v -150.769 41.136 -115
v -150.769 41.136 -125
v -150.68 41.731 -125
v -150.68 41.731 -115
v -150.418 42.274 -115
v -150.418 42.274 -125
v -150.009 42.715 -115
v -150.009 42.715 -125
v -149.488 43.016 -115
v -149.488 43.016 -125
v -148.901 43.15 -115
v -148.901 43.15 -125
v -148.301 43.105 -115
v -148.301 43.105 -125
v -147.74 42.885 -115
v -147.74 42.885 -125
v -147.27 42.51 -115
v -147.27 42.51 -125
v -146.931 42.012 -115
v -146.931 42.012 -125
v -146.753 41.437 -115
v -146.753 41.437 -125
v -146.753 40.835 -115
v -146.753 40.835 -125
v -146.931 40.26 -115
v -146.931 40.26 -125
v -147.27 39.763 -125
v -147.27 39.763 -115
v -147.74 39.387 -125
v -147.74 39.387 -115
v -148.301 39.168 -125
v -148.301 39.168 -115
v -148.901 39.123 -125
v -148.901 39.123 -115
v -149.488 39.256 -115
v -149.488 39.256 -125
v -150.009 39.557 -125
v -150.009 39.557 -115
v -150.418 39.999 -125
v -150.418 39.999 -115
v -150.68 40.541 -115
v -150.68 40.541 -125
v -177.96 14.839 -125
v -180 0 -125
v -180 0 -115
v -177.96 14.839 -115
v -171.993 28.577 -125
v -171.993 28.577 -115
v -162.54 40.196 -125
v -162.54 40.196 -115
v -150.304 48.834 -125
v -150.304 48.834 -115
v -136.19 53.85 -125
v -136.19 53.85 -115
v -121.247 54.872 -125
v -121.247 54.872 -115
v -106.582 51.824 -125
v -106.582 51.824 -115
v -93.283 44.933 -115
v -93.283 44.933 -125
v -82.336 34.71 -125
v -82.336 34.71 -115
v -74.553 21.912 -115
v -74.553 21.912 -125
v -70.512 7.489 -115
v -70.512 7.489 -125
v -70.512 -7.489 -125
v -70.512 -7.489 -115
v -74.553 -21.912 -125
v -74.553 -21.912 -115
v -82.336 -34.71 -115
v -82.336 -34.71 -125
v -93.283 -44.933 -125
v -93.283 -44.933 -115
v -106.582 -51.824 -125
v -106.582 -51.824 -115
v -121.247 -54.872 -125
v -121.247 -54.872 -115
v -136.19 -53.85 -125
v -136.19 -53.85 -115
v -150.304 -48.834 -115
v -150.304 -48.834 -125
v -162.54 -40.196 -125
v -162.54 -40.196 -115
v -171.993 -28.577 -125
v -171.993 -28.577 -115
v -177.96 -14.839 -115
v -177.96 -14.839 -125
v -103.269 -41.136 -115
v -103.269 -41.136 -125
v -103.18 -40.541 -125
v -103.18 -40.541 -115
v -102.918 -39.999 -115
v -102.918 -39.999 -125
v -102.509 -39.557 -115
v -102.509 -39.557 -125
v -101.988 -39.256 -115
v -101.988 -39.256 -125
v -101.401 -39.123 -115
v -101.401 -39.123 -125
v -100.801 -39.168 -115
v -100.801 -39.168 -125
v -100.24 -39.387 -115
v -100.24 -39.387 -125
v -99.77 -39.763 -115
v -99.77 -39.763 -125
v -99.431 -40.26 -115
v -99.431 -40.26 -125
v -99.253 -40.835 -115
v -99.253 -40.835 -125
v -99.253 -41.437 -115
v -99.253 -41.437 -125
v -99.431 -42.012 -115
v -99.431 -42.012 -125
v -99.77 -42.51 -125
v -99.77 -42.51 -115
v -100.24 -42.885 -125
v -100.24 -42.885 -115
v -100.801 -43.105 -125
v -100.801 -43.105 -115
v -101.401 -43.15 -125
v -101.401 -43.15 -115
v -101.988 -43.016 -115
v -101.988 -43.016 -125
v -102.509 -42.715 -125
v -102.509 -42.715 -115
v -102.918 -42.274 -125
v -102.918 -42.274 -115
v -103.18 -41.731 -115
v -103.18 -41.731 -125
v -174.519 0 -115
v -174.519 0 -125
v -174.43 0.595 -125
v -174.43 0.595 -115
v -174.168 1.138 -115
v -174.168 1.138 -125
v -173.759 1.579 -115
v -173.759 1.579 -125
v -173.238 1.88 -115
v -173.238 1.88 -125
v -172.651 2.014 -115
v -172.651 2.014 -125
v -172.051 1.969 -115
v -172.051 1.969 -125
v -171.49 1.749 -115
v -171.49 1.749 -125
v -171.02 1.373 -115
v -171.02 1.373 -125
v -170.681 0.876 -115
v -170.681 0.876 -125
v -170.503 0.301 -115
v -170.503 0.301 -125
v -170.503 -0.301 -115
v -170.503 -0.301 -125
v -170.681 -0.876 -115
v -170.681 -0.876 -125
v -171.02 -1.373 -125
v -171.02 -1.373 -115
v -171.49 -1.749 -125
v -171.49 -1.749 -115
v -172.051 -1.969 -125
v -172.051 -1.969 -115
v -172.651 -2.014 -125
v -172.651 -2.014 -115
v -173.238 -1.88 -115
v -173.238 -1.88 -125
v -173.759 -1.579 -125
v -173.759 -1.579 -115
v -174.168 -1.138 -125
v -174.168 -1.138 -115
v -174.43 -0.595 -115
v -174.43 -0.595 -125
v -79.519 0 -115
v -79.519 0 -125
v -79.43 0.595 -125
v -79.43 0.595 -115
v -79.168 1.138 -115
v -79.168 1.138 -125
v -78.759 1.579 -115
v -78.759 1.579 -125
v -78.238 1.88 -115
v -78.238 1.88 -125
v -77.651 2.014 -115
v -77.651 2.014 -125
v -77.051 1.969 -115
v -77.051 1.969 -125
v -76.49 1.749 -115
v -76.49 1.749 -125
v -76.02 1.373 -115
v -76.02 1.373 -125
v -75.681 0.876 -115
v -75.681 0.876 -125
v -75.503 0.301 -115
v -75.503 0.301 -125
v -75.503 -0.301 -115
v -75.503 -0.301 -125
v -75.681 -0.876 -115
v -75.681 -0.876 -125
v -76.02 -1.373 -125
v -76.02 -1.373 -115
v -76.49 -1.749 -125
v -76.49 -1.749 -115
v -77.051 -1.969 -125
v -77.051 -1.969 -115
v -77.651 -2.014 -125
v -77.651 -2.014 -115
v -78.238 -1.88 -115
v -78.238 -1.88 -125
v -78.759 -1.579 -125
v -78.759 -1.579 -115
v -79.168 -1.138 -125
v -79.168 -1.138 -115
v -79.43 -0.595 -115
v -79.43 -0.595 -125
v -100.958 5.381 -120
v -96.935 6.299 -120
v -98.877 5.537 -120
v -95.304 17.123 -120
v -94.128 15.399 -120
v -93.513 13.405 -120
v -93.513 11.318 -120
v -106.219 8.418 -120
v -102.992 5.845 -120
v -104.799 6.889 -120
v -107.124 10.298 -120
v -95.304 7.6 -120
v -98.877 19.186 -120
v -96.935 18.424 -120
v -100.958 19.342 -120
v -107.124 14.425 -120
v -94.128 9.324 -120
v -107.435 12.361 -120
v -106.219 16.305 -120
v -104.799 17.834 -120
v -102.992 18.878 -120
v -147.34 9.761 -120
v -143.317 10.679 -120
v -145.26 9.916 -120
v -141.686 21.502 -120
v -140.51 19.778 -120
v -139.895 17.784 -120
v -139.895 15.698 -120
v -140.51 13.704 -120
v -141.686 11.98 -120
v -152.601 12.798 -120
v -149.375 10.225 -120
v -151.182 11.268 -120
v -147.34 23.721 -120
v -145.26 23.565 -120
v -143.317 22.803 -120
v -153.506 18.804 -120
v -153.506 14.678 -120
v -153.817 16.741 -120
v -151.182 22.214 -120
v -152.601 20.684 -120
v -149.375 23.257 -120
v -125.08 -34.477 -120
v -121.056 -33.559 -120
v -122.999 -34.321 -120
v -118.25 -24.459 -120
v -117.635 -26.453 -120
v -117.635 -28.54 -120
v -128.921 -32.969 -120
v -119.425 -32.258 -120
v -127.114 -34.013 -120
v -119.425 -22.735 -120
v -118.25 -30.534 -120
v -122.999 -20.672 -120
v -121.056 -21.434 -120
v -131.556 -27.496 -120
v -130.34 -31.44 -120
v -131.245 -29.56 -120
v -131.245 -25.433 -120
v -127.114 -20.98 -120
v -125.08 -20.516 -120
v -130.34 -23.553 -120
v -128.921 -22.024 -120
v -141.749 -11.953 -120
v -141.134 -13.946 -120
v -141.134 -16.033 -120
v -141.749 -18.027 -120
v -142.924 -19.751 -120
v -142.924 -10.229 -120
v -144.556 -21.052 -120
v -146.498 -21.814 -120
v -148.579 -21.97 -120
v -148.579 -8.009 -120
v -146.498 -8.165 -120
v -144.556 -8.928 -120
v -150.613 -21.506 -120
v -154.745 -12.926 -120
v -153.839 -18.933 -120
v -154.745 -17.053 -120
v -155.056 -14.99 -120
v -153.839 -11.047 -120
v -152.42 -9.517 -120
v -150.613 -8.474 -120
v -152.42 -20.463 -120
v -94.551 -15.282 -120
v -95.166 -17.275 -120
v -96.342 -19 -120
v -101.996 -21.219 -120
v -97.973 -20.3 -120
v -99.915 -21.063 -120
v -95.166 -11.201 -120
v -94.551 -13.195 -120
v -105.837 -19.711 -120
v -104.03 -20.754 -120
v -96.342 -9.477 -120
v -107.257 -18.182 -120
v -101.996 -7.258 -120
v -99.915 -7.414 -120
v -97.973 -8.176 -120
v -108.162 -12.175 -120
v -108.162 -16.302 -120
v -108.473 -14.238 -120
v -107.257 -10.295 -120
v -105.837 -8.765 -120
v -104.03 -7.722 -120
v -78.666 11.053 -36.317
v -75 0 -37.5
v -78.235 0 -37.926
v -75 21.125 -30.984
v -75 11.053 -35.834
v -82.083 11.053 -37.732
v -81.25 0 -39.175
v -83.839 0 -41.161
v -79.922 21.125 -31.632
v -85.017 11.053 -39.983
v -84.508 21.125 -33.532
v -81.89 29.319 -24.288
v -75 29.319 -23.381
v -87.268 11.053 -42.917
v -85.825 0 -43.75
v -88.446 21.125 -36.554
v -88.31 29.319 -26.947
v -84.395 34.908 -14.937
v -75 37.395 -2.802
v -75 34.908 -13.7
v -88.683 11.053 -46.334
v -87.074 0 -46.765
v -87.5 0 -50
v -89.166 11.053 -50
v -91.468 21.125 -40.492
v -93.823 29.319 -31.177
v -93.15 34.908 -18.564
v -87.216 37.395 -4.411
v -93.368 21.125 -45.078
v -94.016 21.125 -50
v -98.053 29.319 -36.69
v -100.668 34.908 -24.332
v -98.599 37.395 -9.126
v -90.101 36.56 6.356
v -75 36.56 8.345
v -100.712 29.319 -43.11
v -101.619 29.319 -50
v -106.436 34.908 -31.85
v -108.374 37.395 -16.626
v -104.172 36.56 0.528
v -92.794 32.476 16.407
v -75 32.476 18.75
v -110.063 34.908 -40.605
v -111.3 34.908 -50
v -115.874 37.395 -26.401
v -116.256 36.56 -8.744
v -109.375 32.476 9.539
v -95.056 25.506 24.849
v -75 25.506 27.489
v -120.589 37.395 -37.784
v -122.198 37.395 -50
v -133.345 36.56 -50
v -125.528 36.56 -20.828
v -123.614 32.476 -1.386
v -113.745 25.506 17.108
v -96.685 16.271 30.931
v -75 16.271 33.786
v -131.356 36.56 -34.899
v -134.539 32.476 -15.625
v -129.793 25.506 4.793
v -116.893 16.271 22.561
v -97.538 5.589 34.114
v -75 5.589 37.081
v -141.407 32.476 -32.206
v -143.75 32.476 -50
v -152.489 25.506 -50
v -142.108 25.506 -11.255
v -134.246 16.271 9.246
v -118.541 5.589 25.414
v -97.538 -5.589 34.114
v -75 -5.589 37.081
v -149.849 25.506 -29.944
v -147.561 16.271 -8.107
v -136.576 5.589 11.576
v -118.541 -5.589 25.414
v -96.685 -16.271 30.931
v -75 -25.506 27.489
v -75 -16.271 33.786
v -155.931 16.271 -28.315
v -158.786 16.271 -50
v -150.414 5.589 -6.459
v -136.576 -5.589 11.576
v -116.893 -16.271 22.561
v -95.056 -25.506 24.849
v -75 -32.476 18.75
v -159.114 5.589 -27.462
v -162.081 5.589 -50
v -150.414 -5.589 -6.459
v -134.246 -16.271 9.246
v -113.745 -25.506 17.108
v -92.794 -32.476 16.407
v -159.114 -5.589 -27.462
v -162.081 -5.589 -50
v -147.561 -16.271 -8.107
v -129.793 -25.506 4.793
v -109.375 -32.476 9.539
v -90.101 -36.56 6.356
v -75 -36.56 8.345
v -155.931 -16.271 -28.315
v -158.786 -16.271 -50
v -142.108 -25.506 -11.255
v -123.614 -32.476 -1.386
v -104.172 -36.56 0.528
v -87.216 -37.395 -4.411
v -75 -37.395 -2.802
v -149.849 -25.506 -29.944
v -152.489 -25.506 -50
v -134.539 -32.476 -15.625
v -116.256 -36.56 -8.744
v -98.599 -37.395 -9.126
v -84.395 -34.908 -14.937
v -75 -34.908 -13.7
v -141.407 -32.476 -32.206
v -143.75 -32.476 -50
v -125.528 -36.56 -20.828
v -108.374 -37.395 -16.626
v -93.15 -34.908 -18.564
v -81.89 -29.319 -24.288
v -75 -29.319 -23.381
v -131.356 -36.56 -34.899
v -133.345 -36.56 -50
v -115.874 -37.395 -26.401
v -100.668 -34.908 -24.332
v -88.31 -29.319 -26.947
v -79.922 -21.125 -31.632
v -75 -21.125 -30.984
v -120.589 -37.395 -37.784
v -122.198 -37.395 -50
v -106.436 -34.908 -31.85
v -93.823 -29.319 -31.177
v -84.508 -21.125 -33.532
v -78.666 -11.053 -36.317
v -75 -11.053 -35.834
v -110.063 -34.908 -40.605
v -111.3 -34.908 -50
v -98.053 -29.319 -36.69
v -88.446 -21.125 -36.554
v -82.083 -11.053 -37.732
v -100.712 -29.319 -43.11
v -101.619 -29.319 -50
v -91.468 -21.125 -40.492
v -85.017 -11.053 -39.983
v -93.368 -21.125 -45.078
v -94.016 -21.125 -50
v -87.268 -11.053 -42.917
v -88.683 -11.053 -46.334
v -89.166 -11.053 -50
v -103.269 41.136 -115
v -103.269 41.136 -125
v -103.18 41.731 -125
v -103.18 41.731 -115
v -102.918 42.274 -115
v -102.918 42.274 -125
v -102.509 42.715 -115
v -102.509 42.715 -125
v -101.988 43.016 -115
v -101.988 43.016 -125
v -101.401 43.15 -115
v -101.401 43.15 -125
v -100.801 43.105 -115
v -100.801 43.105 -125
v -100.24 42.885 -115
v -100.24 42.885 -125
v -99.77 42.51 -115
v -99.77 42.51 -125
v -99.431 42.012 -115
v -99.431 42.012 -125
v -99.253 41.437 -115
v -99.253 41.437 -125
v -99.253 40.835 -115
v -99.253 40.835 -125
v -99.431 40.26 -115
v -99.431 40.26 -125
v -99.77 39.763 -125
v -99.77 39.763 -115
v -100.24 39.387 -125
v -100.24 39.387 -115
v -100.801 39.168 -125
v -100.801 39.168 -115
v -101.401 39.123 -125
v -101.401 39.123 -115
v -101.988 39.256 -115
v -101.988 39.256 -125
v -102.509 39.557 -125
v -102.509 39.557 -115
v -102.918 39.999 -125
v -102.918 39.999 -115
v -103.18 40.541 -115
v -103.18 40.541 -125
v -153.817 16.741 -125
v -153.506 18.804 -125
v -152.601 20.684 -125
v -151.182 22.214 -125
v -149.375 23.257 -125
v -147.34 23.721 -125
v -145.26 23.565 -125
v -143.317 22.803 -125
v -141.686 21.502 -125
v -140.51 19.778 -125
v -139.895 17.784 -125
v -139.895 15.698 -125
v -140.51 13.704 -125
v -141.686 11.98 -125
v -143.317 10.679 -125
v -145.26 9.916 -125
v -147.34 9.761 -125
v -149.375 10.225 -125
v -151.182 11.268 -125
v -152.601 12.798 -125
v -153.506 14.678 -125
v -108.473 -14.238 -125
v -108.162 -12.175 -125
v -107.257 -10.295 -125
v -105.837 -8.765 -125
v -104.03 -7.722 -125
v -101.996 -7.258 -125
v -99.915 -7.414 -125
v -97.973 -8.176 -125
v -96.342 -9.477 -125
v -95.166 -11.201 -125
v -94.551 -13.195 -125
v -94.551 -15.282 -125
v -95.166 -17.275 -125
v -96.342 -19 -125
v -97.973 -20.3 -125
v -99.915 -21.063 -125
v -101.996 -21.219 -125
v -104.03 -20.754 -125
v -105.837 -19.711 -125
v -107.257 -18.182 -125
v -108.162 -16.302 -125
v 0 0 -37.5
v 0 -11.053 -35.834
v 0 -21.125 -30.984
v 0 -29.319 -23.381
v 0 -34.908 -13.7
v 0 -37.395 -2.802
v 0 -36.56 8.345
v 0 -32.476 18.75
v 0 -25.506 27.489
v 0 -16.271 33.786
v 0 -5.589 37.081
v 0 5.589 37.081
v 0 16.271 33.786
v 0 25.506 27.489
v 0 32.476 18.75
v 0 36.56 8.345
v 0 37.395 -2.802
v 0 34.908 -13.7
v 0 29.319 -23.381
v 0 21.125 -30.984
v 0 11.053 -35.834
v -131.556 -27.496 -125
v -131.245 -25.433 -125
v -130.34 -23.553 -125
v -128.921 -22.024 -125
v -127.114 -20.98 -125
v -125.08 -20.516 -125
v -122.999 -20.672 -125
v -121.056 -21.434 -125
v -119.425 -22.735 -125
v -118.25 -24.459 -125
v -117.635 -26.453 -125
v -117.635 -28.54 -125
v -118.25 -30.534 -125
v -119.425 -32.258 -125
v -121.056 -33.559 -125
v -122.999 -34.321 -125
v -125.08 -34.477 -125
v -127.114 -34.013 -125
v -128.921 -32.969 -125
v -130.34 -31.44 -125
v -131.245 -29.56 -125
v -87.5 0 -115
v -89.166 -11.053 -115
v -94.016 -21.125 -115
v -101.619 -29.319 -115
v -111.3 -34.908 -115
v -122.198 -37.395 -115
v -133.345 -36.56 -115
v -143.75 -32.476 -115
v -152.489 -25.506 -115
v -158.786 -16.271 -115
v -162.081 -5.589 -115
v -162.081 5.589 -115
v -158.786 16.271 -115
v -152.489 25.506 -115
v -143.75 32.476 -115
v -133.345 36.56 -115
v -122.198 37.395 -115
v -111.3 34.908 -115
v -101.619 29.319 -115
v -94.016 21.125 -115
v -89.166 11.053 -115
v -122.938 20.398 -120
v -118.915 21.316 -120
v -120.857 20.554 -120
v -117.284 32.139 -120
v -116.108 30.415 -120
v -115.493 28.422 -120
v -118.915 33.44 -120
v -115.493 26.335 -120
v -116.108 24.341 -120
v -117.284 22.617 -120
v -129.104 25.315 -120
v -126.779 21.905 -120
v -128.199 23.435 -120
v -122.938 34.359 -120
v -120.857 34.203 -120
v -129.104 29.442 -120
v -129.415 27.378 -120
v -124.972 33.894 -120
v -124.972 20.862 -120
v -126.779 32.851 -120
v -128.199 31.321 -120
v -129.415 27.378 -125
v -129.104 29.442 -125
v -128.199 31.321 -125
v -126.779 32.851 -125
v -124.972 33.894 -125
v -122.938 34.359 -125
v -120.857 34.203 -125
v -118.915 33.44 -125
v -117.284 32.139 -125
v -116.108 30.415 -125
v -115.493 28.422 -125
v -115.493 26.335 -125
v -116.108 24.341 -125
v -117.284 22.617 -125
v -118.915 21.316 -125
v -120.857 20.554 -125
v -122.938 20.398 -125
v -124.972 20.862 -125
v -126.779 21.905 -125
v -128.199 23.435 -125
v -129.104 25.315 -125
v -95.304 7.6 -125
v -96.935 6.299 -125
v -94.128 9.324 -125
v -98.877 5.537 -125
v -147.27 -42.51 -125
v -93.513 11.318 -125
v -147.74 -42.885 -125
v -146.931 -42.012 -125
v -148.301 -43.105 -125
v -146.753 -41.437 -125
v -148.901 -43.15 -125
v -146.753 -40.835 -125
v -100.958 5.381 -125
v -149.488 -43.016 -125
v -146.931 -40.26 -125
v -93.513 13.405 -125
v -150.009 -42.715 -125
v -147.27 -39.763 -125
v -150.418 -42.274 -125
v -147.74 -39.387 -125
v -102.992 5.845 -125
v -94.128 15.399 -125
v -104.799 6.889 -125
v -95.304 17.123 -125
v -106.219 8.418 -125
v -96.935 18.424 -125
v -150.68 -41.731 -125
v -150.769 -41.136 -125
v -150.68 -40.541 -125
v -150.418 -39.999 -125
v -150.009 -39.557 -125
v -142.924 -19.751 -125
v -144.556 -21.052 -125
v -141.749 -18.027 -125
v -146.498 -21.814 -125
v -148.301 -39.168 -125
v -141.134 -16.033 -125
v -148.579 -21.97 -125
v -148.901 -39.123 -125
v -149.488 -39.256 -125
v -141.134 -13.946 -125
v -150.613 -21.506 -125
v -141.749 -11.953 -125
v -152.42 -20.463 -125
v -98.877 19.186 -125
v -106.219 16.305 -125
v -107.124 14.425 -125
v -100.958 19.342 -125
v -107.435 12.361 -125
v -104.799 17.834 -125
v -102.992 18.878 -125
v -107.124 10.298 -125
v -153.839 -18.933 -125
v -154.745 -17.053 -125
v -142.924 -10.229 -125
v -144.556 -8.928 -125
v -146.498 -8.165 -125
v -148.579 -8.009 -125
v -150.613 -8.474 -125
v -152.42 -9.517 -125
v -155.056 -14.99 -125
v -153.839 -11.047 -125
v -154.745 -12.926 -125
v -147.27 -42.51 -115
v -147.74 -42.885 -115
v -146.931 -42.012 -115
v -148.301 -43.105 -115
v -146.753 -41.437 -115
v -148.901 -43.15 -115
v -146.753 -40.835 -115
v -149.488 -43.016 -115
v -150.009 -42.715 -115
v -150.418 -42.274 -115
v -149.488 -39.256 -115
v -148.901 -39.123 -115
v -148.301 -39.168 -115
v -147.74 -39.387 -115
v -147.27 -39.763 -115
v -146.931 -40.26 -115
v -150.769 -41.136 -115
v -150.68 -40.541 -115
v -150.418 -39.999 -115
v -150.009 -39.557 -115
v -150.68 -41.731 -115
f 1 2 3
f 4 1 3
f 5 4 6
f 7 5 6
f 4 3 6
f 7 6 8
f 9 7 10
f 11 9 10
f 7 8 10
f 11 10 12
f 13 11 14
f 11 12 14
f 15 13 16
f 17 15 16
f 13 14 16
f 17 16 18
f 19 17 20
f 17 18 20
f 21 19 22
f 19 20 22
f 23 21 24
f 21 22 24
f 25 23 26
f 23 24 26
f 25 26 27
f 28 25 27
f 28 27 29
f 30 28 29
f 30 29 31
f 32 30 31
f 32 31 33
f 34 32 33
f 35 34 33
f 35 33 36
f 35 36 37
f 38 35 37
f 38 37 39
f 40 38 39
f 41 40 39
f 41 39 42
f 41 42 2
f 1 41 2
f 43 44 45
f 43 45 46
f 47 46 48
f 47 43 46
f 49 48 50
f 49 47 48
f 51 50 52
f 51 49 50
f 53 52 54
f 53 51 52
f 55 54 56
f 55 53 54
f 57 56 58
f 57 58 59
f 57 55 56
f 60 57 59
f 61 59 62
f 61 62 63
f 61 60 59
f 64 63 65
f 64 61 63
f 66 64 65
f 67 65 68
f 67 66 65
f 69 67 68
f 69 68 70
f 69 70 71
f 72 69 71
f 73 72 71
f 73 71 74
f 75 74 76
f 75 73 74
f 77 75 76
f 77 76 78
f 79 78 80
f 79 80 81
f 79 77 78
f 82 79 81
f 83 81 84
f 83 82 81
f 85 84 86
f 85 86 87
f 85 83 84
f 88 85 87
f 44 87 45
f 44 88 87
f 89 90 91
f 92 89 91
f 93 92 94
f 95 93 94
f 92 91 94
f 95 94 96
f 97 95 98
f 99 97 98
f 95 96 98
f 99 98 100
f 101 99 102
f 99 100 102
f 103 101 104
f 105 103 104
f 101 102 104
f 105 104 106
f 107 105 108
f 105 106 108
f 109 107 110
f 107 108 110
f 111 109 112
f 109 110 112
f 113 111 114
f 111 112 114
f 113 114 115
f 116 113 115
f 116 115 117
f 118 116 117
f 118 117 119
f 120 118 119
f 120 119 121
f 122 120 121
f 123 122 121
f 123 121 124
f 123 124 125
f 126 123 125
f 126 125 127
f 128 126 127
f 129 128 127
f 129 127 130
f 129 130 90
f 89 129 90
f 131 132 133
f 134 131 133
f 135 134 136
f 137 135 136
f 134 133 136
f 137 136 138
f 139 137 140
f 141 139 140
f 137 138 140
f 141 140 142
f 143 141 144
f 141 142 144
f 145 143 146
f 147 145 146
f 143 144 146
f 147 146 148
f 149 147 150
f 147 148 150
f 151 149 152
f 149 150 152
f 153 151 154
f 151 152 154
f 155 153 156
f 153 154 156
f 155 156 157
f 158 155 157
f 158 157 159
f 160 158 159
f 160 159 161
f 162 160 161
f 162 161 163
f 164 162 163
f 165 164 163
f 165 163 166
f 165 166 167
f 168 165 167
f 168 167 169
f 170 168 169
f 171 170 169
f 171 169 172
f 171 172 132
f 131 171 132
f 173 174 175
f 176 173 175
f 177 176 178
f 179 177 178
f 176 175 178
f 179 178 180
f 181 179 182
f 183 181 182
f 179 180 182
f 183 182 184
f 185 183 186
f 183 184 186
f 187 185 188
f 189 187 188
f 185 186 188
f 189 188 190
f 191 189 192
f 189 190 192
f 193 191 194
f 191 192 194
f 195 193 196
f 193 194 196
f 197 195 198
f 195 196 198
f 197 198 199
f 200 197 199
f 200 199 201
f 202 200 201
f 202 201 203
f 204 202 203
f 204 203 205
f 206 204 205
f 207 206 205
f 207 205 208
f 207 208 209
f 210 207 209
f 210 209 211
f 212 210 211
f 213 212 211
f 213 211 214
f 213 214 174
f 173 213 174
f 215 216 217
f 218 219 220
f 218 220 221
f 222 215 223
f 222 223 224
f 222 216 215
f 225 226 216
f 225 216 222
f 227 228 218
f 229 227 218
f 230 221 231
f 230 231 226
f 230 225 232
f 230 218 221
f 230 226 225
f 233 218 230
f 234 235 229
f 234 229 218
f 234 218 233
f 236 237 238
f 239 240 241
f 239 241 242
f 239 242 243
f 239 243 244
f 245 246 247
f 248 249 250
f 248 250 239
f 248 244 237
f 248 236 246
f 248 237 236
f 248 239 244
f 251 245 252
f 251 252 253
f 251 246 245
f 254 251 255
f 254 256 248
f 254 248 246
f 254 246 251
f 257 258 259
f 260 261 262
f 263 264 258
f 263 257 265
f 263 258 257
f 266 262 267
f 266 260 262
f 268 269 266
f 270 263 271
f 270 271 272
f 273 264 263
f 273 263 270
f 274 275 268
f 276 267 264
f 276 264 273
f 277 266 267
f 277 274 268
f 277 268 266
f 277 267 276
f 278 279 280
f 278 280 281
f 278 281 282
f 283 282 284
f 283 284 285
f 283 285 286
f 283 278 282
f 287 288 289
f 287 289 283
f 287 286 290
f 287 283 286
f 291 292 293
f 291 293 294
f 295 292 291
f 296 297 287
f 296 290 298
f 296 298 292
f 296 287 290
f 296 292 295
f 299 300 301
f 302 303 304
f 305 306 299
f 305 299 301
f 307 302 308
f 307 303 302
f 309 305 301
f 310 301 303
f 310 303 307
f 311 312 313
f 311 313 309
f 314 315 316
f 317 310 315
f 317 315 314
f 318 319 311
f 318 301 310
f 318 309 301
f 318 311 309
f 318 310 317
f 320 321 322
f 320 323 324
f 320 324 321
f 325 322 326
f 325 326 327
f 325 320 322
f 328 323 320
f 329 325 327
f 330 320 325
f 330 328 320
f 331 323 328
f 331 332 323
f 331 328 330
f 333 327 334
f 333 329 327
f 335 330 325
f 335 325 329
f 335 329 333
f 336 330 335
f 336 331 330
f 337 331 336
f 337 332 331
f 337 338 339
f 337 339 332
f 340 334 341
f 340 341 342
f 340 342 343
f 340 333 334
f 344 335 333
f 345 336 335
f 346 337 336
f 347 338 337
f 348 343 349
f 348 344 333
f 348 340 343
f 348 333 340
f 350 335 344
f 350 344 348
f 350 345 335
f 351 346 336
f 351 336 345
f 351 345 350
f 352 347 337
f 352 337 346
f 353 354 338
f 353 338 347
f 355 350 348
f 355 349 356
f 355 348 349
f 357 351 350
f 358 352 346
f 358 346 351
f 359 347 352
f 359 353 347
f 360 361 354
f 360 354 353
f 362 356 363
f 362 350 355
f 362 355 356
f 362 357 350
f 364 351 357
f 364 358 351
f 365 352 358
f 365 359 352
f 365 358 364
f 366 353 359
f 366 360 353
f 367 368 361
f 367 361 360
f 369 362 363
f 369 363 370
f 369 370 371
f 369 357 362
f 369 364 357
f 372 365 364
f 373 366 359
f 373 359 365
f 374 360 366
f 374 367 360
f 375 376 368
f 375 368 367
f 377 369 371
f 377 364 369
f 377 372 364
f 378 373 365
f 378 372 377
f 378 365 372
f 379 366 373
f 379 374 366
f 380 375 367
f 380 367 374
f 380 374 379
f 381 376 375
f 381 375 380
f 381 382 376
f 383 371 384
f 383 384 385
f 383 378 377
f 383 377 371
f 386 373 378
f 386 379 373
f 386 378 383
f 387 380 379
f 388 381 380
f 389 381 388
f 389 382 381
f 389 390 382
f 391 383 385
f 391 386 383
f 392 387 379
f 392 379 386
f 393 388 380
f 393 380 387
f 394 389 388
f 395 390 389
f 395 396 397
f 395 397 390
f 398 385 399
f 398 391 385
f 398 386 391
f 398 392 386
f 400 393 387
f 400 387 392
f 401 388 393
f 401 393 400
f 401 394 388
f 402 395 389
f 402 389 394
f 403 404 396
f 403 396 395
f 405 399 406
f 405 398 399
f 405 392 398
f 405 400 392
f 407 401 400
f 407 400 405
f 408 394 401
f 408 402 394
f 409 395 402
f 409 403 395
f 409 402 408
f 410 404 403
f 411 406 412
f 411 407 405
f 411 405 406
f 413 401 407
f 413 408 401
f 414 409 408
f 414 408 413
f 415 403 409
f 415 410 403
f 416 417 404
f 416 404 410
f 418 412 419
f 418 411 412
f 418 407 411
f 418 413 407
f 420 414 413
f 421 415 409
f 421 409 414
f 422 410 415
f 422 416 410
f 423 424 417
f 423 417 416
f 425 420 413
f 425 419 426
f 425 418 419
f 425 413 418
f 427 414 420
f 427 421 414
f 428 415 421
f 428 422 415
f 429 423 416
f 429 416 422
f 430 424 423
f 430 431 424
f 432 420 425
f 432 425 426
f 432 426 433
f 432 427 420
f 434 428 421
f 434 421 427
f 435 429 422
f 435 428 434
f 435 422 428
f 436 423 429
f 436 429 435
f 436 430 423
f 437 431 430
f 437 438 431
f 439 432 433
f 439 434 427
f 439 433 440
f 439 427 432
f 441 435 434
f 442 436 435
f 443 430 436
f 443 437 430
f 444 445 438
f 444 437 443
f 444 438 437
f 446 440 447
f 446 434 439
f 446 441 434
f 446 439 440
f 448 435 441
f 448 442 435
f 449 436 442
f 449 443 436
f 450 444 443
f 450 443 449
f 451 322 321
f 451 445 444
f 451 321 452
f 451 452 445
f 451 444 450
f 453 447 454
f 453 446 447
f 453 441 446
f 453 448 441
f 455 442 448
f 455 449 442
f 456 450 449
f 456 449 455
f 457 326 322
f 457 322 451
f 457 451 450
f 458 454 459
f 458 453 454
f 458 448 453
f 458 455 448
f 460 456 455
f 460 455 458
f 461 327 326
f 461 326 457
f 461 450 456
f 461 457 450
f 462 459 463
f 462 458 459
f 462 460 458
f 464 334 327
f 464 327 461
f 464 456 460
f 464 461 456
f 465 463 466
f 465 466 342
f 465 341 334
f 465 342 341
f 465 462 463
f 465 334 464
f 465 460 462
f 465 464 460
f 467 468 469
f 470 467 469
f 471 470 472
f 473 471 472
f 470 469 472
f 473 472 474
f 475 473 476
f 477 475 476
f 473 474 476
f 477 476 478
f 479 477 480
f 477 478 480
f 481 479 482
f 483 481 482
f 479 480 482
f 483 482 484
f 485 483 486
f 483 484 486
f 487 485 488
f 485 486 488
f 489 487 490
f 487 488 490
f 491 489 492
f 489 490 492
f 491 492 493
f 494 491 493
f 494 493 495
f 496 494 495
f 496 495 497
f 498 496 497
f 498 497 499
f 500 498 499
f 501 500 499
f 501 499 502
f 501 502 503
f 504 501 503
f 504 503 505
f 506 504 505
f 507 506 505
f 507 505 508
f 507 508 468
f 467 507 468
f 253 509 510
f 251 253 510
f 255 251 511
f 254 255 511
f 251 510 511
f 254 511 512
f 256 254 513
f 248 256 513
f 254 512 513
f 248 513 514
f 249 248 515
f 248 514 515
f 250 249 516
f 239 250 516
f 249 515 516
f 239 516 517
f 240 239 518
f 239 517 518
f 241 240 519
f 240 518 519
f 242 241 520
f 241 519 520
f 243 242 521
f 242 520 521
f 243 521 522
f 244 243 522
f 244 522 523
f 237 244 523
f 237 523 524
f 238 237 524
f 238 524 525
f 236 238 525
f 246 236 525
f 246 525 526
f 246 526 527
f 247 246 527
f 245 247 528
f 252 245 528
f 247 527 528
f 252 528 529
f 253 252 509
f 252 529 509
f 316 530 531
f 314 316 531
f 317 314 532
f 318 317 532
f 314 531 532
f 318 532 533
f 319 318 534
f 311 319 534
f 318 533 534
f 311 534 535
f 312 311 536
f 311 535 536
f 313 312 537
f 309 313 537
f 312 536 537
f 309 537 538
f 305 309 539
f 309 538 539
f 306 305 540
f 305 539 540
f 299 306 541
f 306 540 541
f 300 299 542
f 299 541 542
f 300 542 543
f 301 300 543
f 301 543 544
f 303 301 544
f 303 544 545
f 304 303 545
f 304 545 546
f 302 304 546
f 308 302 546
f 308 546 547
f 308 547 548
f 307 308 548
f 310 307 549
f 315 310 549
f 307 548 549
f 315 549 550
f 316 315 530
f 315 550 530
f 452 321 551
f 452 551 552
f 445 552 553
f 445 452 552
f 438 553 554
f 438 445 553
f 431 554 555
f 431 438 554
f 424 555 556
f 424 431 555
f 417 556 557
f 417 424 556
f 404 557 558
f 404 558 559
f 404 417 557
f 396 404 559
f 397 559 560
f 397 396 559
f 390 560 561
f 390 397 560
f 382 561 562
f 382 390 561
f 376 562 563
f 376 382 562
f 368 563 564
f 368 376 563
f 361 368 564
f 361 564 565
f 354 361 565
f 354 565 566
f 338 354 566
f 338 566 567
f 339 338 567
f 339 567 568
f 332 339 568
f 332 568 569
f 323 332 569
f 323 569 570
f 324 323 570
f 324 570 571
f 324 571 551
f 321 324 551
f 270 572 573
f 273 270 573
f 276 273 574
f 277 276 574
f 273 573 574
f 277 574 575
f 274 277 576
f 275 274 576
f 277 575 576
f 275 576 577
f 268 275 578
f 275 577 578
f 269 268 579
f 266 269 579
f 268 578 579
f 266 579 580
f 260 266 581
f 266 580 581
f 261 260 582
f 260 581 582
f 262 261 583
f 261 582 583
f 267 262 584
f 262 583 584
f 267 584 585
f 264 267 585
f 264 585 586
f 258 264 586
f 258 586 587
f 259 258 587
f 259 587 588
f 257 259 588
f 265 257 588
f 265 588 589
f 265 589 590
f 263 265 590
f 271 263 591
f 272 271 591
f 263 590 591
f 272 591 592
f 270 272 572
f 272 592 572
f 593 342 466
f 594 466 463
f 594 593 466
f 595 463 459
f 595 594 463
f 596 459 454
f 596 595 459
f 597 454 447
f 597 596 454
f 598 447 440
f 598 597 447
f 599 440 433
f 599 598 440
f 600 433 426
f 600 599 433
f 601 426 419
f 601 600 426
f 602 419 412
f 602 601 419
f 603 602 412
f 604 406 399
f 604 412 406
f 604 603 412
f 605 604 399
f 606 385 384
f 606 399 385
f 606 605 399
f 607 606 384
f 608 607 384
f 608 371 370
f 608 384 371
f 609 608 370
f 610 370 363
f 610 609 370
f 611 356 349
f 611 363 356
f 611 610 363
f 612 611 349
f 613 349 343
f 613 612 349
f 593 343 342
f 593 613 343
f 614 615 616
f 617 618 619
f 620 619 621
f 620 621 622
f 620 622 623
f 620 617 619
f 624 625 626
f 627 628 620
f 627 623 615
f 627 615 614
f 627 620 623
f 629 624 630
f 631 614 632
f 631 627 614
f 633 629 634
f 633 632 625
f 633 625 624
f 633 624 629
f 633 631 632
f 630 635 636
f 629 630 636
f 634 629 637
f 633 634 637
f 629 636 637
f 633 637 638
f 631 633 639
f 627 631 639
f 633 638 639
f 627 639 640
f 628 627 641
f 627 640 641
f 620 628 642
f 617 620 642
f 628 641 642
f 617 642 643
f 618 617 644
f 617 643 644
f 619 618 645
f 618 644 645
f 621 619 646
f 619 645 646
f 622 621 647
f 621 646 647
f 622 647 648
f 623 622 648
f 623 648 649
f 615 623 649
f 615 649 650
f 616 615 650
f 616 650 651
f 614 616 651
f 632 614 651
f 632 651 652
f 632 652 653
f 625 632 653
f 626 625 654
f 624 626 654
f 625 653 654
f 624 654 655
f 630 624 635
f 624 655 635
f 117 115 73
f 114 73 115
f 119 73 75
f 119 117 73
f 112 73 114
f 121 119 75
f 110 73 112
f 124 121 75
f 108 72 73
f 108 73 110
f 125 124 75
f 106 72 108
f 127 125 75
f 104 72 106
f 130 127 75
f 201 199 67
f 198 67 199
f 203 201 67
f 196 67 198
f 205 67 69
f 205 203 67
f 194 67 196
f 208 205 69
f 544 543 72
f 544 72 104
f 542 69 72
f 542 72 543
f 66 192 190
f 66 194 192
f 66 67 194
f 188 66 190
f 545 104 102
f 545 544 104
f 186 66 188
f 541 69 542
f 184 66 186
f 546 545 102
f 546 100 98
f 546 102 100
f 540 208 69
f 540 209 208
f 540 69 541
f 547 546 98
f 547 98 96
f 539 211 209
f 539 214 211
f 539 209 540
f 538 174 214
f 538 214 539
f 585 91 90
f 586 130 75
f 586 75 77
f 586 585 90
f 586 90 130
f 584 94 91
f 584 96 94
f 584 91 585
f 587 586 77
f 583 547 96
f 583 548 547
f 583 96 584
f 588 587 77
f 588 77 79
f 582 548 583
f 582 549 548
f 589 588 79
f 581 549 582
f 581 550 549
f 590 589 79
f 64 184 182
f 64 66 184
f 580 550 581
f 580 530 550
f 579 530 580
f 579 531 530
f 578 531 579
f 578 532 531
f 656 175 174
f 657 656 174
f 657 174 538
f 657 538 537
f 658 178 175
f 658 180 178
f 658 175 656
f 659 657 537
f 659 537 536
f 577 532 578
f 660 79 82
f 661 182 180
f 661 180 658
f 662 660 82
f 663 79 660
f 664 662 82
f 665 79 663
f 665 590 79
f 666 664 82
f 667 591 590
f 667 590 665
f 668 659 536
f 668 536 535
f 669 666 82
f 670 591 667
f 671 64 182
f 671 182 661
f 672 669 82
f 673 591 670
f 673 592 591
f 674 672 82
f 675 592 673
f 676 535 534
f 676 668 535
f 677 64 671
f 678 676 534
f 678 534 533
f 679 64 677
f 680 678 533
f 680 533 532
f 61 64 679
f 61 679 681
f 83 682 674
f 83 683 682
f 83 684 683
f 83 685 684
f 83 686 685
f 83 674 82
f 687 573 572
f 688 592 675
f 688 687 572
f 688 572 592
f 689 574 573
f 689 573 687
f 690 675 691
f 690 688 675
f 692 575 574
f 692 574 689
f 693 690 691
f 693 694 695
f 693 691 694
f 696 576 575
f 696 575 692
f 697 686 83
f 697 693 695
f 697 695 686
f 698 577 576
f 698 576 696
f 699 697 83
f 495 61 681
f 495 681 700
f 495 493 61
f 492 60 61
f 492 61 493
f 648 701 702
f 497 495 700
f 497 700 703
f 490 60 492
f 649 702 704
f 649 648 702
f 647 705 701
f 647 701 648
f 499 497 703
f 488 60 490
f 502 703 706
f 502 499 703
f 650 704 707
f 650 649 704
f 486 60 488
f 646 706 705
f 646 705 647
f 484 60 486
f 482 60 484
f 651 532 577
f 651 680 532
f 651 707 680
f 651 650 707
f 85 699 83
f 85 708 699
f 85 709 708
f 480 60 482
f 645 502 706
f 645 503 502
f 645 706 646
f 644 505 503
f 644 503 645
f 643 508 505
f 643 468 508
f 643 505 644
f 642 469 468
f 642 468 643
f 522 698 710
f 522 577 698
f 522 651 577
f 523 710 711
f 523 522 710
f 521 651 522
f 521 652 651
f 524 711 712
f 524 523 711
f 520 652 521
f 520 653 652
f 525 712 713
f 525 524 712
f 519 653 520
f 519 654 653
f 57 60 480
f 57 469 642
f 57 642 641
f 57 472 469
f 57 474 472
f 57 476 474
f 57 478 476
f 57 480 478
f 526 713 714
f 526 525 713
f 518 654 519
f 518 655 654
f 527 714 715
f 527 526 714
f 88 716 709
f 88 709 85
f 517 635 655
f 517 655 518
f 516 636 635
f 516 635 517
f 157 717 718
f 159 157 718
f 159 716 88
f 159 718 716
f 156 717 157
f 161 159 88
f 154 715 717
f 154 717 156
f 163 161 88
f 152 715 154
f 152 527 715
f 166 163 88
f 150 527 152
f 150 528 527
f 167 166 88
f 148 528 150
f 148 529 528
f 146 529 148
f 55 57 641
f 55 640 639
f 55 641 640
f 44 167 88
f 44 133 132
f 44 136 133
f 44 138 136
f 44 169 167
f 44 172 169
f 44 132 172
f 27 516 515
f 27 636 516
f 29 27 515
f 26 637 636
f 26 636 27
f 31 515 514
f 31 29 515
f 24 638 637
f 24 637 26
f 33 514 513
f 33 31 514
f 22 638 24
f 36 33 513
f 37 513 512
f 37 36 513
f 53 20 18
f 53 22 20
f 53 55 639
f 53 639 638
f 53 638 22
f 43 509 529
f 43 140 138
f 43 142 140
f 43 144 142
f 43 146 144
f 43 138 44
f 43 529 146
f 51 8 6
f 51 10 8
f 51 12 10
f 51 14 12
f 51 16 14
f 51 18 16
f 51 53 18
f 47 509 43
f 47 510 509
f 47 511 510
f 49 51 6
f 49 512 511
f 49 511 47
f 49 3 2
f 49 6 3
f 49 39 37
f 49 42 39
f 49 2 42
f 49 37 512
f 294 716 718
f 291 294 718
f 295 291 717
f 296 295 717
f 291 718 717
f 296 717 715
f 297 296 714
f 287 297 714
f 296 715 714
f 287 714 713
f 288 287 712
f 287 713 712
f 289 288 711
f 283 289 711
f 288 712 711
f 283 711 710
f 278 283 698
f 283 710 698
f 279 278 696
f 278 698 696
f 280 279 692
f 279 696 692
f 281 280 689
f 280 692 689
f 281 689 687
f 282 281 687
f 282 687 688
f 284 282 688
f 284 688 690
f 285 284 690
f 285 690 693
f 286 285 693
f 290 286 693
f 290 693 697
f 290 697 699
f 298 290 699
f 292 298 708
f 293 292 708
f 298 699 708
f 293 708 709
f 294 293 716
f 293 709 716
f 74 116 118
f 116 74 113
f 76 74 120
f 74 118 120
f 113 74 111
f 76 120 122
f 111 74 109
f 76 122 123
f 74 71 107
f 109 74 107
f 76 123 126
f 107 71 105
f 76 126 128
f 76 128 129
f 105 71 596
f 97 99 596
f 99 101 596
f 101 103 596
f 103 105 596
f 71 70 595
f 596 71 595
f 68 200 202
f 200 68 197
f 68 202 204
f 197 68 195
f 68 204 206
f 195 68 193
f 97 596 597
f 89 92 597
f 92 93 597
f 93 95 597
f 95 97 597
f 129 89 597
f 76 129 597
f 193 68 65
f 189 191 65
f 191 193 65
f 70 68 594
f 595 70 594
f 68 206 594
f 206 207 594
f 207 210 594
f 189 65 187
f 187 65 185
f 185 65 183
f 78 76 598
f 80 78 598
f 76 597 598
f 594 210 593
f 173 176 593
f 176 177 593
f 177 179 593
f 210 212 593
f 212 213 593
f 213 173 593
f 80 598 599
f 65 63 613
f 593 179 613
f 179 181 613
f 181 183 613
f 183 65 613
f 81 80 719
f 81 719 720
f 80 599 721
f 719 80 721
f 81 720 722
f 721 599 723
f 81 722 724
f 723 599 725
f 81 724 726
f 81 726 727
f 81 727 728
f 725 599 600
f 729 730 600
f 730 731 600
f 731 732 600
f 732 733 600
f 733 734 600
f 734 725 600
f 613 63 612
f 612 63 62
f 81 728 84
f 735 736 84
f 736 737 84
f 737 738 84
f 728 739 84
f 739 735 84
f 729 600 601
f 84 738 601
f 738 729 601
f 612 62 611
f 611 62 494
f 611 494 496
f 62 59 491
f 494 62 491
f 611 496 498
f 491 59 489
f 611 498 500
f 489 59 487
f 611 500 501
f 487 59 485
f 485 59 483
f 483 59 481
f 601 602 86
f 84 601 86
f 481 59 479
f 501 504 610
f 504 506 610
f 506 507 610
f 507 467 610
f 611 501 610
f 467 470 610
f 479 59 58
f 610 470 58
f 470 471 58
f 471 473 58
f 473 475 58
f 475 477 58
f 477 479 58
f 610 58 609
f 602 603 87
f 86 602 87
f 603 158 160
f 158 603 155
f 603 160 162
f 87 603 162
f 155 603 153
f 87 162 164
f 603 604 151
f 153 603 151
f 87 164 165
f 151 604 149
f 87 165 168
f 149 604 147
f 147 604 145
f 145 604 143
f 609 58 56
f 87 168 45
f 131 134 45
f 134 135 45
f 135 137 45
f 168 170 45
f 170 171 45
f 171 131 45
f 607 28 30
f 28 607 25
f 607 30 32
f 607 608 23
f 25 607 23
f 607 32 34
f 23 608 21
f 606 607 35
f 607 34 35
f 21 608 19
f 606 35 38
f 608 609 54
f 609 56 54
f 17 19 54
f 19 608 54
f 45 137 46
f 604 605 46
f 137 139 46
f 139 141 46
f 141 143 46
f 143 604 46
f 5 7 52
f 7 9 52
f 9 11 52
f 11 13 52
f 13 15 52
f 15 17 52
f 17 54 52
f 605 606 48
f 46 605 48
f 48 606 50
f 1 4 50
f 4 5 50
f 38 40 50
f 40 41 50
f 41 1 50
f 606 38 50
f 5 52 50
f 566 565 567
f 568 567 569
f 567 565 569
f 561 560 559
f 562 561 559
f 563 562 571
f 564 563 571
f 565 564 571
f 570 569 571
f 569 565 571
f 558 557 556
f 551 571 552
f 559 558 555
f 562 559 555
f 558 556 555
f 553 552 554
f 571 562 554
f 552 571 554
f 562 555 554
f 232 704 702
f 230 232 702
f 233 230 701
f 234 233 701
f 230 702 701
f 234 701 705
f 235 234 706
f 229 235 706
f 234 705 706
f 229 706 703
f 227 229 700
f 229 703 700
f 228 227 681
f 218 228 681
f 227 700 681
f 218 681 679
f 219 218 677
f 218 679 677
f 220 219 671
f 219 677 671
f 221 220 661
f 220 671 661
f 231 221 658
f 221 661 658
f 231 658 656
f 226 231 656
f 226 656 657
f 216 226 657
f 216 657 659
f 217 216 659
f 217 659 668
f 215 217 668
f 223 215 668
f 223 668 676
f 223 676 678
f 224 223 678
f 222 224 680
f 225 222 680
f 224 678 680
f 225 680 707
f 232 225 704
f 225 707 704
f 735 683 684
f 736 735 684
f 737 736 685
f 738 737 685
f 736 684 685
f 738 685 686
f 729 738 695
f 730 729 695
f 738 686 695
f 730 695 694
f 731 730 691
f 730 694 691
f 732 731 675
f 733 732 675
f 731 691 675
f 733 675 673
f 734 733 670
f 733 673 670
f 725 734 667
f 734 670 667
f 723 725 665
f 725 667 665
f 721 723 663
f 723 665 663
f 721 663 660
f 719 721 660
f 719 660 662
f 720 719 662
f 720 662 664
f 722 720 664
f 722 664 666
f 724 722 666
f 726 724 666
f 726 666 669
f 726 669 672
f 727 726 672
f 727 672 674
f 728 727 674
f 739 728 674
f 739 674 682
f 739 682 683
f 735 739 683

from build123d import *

# Parameters (mm, degrees)
SWEEP1_PROFILE_R               = 37.5
SKETCH3_R                      = 55
BOSS_EXTRUDE1_DEPTH            = 10
TAP_DRILL_FOR_10_32_TAP1_D     = 4.0386
TAP_DRILL_FOR_10_32_TAP1_DEPTH = 10
SKETCH11_R                     = 7
CUT_EXTRUDE1_DEPTH             = 5


with BuildPart() as part:
    # Sweep1: sweep along a path in Sketch1
    with BuildLine(Plane(origin=(0, 0, 0), x_dir=(1, 0, 0), z_dir=(0, 1, 0))) as sweep1_path:
        Line((0, 0), (-75, 0))
        ThreePointArc((-75, 0), (-110.355339059, 14.644660941), (-125, 50))
        Line((-125, 50), (-125, 125))
    # Sweep1 profile (on start of the path) → Sweep1 (sweep)
    with BuildSketch(Plane(origin=(0, 0, 0), x_dir=(0, 0, -1), z_dir=(-1, 0, 0))):
        Circle(SWEEP1_PROFILE_R)
    sweep(path=sweep1_path.line)

    # Sketch3 → Boss-Extrude1 (add)
    with BuildSketch(Plane(origin=(0, 0, -125), x_dir=(-1, 0, 0), z_dir=(0, 0, -1))):
        with Locations((125, 0)):
            Circle(SKETCH3_R)
    extrude(amount=-BOSS_EXTRUDE1_DEPTH)

    # Tap Drill for #10-32 Tap1
    with Locations(Plane.XY.offset(-115)):
        with Locations((-148.75, 41.13620668), (-172.5, 0), (-148.75, -41.13620668), (-101.25, -41.13620668), (-77.5, 0), (-101.25, 41.13620668)):
            Hole(TAP_DRILL_FOR_10_32_TAP1_D / 2, depth=TAP_DRILL_FOR_10_32_TAP1_DEPTH)

    # Sketch11 → Cut-Extrude1 (cut)
    with BuildSketch(Plane(origin=(0, 0, -125), x_dir=(-1, 0, 0), z_dir=(0, 0, -1))):
        with Locations((146.817216858, 16.740939298)):
            Circle(SKETCH11_R)
        with Locations((122.414911455, 27.378227065)):
            Circle(SKETCH11_R)
        with Locations((100.434896061, 12.361458995)):
            Circle(SKETCH11_R)
        with Locations((101.47297262, -14.238292828)):
            Circle(SKETCH11_R)
        with Locations((124.556438483, -27.496422552)):
            Circle(SKETCH11_R)
        with Locations((148.055532132, -14.989744431)):
            Circle(SKETCH11_R)
    extrude(amount=-CUT_EXTRUDE1_DEPTH, mode=Mode.SUBTRACT)


solid = part.part
